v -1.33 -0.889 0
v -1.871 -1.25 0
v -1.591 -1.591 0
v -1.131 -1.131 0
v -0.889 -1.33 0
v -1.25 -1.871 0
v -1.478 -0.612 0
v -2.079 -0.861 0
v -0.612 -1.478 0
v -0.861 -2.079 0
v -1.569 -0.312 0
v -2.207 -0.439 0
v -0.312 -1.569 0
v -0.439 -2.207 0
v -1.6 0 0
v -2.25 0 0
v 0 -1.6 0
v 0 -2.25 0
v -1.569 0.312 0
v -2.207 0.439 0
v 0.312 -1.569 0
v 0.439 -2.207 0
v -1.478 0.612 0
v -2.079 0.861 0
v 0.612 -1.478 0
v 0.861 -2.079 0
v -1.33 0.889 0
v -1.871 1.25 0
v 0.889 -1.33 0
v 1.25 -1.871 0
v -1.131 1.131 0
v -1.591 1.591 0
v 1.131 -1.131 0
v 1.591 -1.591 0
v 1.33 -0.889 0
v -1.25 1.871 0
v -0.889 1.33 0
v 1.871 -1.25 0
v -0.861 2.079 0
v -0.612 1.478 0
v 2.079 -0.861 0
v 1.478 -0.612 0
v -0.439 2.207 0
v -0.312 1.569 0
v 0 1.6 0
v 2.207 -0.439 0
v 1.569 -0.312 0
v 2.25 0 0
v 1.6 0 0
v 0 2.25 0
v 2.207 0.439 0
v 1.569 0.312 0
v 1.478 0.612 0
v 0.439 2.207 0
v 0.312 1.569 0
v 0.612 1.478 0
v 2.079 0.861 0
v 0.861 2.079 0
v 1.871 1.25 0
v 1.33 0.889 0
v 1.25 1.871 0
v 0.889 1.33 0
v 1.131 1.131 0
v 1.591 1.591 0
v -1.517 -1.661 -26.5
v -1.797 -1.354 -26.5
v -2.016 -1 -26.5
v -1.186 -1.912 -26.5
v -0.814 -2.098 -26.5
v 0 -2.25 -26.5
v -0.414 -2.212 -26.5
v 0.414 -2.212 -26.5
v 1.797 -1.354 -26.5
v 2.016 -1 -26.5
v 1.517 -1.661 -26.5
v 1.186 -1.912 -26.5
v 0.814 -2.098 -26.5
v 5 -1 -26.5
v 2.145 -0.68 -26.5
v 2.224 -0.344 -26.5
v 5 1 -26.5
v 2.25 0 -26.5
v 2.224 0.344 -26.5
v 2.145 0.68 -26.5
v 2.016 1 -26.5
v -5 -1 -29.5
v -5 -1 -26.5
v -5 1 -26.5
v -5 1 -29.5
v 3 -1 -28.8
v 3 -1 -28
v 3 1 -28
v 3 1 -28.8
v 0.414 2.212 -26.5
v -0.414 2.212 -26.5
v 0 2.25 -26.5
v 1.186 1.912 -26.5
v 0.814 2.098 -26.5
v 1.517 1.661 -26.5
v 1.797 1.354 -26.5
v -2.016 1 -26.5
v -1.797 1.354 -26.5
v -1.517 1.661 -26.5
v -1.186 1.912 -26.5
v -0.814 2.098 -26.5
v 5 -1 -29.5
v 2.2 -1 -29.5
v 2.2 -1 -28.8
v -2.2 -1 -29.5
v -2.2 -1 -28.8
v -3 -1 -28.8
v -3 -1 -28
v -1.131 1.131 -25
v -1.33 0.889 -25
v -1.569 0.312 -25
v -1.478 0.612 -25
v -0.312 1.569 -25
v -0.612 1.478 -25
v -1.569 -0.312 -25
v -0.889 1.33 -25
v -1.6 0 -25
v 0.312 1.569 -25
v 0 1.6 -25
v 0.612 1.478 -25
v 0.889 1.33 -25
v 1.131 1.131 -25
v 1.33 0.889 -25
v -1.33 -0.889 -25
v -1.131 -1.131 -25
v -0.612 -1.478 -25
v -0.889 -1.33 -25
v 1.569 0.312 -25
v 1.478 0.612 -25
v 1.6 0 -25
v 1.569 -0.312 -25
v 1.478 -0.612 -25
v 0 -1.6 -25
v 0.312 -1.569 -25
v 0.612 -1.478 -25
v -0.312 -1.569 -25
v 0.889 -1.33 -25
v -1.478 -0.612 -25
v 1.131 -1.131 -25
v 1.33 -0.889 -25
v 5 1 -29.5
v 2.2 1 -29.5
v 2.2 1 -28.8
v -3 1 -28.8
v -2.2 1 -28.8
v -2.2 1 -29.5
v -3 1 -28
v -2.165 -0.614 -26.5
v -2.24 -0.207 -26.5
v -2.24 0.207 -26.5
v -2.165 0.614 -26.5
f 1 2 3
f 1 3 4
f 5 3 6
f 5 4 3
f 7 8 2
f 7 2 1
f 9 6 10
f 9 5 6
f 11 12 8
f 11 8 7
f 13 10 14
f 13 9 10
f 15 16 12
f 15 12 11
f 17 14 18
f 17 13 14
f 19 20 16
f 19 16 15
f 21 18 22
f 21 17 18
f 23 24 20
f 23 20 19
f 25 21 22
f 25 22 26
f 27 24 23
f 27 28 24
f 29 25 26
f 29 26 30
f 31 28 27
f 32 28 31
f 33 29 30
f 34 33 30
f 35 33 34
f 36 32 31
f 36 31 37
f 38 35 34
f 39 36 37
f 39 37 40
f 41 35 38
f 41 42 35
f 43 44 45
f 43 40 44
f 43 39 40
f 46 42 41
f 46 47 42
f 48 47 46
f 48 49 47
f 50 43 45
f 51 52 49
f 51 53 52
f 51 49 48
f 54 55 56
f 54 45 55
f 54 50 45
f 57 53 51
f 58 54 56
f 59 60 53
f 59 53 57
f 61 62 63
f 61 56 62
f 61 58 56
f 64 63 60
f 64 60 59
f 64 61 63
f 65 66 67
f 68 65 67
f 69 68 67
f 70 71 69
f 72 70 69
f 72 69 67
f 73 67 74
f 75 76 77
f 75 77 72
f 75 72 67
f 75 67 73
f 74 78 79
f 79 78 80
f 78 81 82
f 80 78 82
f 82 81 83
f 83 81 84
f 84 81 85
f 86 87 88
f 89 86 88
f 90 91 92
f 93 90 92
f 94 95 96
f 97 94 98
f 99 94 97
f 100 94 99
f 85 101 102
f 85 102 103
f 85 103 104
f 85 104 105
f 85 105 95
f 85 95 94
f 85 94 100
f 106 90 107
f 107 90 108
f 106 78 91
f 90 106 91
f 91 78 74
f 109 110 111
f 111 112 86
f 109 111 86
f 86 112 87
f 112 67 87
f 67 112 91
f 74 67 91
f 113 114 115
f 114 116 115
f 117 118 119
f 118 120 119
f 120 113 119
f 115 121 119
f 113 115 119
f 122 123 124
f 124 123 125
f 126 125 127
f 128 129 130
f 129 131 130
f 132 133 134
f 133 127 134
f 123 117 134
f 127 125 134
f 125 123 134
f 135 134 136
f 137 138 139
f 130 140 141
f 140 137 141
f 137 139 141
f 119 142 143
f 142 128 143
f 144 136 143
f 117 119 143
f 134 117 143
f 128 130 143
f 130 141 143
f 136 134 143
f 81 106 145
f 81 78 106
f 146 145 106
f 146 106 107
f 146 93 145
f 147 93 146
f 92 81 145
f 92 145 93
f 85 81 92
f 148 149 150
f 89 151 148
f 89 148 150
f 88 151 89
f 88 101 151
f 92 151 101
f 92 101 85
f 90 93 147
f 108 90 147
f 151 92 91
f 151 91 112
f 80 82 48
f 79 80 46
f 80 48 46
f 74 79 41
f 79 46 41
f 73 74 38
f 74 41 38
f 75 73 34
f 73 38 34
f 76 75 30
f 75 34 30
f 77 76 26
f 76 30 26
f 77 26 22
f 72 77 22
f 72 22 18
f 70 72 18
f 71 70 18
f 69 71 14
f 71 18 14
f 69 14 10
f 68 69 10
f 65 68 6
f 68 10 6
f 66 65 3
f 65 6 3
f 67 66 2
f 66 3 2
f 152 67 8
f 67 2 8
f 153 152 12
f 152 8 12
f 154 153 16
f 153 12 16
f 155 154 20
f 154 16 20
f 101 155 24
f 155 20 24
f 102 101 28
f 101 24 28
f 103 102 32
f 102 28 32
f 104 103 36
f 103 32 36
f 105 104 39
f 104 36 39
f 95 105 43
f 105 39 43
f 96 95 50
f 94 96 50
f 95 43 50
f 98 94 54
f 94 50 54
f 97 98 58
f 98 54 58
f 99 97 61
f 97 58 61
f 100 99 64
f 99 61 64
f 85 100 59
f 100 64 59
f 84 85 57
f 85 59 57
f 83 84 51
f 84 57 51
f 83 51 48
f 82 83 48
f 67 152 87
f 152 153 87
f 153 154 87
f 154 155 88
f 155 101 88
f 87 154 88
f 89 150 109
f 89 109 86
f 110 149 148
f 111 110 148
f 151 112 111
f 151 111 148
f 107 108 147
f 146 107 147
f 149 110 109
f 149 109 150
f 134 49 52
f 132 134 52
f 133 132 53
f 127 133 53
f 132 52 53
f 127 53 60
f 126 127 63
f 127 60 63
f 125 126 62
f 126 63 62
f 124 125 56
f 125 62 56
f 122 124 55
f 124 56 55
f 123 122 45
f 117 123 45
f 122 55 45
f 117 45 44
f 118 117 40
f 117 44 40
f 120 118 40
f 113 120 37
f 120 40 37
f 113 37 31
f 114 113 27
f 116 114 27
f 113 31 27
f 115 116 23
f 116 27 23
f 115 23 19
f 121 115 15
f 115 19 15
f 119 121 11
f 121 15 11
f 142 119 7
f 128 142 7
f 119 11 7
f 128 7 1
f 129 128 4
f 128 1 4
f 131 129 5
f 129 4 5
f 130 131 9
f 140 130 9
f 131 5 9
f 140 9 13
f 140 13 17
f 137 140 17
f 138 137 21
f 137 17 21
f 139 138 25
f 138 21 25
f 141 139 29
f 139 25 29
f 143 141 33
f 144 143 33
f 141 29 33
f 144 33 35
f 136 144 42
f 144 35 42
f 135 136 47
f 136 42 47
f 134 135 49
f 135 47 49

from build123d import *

# Parameters (mm, degrees)
SKETCH1_R           = 2.25
SKETCH1_R_2         = 1.6
BOSS_EXTRUDE1_DEPTH = 25
SKETCH2_R           = 2.25
BOSS_EXTRUDE2_DEPTH = 1.5
SKETCH3_W           = 10
SKETCH3_H           = 2
BOSS_EXTRUDE3_DEPTH = 1.5
SKETCH4_W           = 2
SKETCH4_H           = 2
BOSS_EXTRUDE4_DEPTH = 0.8
SKETCH5_W           = 2.8
SKETCH5_H           = 2
BOSS_EXTRUDE5_DEPTH = 0.7


with BuildPart() as part:
    # Sketch1 → Boss-Extrude1 (new body)
    with BuildSketch(Plane.XY):
        Circle(SKETCH1_R)
        Circle(SKETCH1_R_2, mode=Mode.SUBTRACT)
    extrude(amount=-BOSS_EXTRUDE1_DEPTH)

    # Sketch2 → Boss-Extrude2 (add)
    with BuildSketch(Plane(origin=(0, 0, -25), x_dir=(-1, 0, 0), z_dir=(0, 0, -1))):
        with Locations(Location((0, 0, 0), (0, 0, 180))):
            Circle(SKETCH2_R)
    extrude(amount=BOSS_EXTRUDE2_DEPTH)

    # Sketch3 → Boss-Extrude3 (add)
    with BuildSketch(Plane(origin=(0, 0, -26.5), x_dir=(-1, 0, 0), z_dir=(0, 0, -1))):
        Rectangle(SKETCH3_W, SKETCH3_H)
    extrude(amount=BOSS_EXTRUDE3_DEPTH)

    # Sketch4 → Boss-Extrude4 (add)
    with BuildSketch(Plane(origin=(0, 0, -28), x_dir=(-1, 0, 0), z_dir=(0, 0, -1))):
        with Locations((-4, 0)):
            Rectangle(SKETCH4_W, SKETCH4_H)
        with Locations((4, 0)):
            Rectangle(SKETCH4_W, SKETCH4_H)
    extrude(amount=BOSS_EXTRUDE4_DEPTH)

    # Sketch5 → Boss-Extrude5 (add)
    with BuildSketch(Plane(origin=(0, 0, -28.8), x_dir=(-1, 0, 0), z_dir=(0, 0, -1))):
        with Locations((-3.6, 0)):
            Rectangle(SKETCH5_W, SKETCH5_H)
        with Locations((3.6, 0)):
            Rectangle(SKETCH5_W, SKETCH5_H)
    extrude(amount=BOSS_EXTRUDE5_DEPTH)


solid = part.part
